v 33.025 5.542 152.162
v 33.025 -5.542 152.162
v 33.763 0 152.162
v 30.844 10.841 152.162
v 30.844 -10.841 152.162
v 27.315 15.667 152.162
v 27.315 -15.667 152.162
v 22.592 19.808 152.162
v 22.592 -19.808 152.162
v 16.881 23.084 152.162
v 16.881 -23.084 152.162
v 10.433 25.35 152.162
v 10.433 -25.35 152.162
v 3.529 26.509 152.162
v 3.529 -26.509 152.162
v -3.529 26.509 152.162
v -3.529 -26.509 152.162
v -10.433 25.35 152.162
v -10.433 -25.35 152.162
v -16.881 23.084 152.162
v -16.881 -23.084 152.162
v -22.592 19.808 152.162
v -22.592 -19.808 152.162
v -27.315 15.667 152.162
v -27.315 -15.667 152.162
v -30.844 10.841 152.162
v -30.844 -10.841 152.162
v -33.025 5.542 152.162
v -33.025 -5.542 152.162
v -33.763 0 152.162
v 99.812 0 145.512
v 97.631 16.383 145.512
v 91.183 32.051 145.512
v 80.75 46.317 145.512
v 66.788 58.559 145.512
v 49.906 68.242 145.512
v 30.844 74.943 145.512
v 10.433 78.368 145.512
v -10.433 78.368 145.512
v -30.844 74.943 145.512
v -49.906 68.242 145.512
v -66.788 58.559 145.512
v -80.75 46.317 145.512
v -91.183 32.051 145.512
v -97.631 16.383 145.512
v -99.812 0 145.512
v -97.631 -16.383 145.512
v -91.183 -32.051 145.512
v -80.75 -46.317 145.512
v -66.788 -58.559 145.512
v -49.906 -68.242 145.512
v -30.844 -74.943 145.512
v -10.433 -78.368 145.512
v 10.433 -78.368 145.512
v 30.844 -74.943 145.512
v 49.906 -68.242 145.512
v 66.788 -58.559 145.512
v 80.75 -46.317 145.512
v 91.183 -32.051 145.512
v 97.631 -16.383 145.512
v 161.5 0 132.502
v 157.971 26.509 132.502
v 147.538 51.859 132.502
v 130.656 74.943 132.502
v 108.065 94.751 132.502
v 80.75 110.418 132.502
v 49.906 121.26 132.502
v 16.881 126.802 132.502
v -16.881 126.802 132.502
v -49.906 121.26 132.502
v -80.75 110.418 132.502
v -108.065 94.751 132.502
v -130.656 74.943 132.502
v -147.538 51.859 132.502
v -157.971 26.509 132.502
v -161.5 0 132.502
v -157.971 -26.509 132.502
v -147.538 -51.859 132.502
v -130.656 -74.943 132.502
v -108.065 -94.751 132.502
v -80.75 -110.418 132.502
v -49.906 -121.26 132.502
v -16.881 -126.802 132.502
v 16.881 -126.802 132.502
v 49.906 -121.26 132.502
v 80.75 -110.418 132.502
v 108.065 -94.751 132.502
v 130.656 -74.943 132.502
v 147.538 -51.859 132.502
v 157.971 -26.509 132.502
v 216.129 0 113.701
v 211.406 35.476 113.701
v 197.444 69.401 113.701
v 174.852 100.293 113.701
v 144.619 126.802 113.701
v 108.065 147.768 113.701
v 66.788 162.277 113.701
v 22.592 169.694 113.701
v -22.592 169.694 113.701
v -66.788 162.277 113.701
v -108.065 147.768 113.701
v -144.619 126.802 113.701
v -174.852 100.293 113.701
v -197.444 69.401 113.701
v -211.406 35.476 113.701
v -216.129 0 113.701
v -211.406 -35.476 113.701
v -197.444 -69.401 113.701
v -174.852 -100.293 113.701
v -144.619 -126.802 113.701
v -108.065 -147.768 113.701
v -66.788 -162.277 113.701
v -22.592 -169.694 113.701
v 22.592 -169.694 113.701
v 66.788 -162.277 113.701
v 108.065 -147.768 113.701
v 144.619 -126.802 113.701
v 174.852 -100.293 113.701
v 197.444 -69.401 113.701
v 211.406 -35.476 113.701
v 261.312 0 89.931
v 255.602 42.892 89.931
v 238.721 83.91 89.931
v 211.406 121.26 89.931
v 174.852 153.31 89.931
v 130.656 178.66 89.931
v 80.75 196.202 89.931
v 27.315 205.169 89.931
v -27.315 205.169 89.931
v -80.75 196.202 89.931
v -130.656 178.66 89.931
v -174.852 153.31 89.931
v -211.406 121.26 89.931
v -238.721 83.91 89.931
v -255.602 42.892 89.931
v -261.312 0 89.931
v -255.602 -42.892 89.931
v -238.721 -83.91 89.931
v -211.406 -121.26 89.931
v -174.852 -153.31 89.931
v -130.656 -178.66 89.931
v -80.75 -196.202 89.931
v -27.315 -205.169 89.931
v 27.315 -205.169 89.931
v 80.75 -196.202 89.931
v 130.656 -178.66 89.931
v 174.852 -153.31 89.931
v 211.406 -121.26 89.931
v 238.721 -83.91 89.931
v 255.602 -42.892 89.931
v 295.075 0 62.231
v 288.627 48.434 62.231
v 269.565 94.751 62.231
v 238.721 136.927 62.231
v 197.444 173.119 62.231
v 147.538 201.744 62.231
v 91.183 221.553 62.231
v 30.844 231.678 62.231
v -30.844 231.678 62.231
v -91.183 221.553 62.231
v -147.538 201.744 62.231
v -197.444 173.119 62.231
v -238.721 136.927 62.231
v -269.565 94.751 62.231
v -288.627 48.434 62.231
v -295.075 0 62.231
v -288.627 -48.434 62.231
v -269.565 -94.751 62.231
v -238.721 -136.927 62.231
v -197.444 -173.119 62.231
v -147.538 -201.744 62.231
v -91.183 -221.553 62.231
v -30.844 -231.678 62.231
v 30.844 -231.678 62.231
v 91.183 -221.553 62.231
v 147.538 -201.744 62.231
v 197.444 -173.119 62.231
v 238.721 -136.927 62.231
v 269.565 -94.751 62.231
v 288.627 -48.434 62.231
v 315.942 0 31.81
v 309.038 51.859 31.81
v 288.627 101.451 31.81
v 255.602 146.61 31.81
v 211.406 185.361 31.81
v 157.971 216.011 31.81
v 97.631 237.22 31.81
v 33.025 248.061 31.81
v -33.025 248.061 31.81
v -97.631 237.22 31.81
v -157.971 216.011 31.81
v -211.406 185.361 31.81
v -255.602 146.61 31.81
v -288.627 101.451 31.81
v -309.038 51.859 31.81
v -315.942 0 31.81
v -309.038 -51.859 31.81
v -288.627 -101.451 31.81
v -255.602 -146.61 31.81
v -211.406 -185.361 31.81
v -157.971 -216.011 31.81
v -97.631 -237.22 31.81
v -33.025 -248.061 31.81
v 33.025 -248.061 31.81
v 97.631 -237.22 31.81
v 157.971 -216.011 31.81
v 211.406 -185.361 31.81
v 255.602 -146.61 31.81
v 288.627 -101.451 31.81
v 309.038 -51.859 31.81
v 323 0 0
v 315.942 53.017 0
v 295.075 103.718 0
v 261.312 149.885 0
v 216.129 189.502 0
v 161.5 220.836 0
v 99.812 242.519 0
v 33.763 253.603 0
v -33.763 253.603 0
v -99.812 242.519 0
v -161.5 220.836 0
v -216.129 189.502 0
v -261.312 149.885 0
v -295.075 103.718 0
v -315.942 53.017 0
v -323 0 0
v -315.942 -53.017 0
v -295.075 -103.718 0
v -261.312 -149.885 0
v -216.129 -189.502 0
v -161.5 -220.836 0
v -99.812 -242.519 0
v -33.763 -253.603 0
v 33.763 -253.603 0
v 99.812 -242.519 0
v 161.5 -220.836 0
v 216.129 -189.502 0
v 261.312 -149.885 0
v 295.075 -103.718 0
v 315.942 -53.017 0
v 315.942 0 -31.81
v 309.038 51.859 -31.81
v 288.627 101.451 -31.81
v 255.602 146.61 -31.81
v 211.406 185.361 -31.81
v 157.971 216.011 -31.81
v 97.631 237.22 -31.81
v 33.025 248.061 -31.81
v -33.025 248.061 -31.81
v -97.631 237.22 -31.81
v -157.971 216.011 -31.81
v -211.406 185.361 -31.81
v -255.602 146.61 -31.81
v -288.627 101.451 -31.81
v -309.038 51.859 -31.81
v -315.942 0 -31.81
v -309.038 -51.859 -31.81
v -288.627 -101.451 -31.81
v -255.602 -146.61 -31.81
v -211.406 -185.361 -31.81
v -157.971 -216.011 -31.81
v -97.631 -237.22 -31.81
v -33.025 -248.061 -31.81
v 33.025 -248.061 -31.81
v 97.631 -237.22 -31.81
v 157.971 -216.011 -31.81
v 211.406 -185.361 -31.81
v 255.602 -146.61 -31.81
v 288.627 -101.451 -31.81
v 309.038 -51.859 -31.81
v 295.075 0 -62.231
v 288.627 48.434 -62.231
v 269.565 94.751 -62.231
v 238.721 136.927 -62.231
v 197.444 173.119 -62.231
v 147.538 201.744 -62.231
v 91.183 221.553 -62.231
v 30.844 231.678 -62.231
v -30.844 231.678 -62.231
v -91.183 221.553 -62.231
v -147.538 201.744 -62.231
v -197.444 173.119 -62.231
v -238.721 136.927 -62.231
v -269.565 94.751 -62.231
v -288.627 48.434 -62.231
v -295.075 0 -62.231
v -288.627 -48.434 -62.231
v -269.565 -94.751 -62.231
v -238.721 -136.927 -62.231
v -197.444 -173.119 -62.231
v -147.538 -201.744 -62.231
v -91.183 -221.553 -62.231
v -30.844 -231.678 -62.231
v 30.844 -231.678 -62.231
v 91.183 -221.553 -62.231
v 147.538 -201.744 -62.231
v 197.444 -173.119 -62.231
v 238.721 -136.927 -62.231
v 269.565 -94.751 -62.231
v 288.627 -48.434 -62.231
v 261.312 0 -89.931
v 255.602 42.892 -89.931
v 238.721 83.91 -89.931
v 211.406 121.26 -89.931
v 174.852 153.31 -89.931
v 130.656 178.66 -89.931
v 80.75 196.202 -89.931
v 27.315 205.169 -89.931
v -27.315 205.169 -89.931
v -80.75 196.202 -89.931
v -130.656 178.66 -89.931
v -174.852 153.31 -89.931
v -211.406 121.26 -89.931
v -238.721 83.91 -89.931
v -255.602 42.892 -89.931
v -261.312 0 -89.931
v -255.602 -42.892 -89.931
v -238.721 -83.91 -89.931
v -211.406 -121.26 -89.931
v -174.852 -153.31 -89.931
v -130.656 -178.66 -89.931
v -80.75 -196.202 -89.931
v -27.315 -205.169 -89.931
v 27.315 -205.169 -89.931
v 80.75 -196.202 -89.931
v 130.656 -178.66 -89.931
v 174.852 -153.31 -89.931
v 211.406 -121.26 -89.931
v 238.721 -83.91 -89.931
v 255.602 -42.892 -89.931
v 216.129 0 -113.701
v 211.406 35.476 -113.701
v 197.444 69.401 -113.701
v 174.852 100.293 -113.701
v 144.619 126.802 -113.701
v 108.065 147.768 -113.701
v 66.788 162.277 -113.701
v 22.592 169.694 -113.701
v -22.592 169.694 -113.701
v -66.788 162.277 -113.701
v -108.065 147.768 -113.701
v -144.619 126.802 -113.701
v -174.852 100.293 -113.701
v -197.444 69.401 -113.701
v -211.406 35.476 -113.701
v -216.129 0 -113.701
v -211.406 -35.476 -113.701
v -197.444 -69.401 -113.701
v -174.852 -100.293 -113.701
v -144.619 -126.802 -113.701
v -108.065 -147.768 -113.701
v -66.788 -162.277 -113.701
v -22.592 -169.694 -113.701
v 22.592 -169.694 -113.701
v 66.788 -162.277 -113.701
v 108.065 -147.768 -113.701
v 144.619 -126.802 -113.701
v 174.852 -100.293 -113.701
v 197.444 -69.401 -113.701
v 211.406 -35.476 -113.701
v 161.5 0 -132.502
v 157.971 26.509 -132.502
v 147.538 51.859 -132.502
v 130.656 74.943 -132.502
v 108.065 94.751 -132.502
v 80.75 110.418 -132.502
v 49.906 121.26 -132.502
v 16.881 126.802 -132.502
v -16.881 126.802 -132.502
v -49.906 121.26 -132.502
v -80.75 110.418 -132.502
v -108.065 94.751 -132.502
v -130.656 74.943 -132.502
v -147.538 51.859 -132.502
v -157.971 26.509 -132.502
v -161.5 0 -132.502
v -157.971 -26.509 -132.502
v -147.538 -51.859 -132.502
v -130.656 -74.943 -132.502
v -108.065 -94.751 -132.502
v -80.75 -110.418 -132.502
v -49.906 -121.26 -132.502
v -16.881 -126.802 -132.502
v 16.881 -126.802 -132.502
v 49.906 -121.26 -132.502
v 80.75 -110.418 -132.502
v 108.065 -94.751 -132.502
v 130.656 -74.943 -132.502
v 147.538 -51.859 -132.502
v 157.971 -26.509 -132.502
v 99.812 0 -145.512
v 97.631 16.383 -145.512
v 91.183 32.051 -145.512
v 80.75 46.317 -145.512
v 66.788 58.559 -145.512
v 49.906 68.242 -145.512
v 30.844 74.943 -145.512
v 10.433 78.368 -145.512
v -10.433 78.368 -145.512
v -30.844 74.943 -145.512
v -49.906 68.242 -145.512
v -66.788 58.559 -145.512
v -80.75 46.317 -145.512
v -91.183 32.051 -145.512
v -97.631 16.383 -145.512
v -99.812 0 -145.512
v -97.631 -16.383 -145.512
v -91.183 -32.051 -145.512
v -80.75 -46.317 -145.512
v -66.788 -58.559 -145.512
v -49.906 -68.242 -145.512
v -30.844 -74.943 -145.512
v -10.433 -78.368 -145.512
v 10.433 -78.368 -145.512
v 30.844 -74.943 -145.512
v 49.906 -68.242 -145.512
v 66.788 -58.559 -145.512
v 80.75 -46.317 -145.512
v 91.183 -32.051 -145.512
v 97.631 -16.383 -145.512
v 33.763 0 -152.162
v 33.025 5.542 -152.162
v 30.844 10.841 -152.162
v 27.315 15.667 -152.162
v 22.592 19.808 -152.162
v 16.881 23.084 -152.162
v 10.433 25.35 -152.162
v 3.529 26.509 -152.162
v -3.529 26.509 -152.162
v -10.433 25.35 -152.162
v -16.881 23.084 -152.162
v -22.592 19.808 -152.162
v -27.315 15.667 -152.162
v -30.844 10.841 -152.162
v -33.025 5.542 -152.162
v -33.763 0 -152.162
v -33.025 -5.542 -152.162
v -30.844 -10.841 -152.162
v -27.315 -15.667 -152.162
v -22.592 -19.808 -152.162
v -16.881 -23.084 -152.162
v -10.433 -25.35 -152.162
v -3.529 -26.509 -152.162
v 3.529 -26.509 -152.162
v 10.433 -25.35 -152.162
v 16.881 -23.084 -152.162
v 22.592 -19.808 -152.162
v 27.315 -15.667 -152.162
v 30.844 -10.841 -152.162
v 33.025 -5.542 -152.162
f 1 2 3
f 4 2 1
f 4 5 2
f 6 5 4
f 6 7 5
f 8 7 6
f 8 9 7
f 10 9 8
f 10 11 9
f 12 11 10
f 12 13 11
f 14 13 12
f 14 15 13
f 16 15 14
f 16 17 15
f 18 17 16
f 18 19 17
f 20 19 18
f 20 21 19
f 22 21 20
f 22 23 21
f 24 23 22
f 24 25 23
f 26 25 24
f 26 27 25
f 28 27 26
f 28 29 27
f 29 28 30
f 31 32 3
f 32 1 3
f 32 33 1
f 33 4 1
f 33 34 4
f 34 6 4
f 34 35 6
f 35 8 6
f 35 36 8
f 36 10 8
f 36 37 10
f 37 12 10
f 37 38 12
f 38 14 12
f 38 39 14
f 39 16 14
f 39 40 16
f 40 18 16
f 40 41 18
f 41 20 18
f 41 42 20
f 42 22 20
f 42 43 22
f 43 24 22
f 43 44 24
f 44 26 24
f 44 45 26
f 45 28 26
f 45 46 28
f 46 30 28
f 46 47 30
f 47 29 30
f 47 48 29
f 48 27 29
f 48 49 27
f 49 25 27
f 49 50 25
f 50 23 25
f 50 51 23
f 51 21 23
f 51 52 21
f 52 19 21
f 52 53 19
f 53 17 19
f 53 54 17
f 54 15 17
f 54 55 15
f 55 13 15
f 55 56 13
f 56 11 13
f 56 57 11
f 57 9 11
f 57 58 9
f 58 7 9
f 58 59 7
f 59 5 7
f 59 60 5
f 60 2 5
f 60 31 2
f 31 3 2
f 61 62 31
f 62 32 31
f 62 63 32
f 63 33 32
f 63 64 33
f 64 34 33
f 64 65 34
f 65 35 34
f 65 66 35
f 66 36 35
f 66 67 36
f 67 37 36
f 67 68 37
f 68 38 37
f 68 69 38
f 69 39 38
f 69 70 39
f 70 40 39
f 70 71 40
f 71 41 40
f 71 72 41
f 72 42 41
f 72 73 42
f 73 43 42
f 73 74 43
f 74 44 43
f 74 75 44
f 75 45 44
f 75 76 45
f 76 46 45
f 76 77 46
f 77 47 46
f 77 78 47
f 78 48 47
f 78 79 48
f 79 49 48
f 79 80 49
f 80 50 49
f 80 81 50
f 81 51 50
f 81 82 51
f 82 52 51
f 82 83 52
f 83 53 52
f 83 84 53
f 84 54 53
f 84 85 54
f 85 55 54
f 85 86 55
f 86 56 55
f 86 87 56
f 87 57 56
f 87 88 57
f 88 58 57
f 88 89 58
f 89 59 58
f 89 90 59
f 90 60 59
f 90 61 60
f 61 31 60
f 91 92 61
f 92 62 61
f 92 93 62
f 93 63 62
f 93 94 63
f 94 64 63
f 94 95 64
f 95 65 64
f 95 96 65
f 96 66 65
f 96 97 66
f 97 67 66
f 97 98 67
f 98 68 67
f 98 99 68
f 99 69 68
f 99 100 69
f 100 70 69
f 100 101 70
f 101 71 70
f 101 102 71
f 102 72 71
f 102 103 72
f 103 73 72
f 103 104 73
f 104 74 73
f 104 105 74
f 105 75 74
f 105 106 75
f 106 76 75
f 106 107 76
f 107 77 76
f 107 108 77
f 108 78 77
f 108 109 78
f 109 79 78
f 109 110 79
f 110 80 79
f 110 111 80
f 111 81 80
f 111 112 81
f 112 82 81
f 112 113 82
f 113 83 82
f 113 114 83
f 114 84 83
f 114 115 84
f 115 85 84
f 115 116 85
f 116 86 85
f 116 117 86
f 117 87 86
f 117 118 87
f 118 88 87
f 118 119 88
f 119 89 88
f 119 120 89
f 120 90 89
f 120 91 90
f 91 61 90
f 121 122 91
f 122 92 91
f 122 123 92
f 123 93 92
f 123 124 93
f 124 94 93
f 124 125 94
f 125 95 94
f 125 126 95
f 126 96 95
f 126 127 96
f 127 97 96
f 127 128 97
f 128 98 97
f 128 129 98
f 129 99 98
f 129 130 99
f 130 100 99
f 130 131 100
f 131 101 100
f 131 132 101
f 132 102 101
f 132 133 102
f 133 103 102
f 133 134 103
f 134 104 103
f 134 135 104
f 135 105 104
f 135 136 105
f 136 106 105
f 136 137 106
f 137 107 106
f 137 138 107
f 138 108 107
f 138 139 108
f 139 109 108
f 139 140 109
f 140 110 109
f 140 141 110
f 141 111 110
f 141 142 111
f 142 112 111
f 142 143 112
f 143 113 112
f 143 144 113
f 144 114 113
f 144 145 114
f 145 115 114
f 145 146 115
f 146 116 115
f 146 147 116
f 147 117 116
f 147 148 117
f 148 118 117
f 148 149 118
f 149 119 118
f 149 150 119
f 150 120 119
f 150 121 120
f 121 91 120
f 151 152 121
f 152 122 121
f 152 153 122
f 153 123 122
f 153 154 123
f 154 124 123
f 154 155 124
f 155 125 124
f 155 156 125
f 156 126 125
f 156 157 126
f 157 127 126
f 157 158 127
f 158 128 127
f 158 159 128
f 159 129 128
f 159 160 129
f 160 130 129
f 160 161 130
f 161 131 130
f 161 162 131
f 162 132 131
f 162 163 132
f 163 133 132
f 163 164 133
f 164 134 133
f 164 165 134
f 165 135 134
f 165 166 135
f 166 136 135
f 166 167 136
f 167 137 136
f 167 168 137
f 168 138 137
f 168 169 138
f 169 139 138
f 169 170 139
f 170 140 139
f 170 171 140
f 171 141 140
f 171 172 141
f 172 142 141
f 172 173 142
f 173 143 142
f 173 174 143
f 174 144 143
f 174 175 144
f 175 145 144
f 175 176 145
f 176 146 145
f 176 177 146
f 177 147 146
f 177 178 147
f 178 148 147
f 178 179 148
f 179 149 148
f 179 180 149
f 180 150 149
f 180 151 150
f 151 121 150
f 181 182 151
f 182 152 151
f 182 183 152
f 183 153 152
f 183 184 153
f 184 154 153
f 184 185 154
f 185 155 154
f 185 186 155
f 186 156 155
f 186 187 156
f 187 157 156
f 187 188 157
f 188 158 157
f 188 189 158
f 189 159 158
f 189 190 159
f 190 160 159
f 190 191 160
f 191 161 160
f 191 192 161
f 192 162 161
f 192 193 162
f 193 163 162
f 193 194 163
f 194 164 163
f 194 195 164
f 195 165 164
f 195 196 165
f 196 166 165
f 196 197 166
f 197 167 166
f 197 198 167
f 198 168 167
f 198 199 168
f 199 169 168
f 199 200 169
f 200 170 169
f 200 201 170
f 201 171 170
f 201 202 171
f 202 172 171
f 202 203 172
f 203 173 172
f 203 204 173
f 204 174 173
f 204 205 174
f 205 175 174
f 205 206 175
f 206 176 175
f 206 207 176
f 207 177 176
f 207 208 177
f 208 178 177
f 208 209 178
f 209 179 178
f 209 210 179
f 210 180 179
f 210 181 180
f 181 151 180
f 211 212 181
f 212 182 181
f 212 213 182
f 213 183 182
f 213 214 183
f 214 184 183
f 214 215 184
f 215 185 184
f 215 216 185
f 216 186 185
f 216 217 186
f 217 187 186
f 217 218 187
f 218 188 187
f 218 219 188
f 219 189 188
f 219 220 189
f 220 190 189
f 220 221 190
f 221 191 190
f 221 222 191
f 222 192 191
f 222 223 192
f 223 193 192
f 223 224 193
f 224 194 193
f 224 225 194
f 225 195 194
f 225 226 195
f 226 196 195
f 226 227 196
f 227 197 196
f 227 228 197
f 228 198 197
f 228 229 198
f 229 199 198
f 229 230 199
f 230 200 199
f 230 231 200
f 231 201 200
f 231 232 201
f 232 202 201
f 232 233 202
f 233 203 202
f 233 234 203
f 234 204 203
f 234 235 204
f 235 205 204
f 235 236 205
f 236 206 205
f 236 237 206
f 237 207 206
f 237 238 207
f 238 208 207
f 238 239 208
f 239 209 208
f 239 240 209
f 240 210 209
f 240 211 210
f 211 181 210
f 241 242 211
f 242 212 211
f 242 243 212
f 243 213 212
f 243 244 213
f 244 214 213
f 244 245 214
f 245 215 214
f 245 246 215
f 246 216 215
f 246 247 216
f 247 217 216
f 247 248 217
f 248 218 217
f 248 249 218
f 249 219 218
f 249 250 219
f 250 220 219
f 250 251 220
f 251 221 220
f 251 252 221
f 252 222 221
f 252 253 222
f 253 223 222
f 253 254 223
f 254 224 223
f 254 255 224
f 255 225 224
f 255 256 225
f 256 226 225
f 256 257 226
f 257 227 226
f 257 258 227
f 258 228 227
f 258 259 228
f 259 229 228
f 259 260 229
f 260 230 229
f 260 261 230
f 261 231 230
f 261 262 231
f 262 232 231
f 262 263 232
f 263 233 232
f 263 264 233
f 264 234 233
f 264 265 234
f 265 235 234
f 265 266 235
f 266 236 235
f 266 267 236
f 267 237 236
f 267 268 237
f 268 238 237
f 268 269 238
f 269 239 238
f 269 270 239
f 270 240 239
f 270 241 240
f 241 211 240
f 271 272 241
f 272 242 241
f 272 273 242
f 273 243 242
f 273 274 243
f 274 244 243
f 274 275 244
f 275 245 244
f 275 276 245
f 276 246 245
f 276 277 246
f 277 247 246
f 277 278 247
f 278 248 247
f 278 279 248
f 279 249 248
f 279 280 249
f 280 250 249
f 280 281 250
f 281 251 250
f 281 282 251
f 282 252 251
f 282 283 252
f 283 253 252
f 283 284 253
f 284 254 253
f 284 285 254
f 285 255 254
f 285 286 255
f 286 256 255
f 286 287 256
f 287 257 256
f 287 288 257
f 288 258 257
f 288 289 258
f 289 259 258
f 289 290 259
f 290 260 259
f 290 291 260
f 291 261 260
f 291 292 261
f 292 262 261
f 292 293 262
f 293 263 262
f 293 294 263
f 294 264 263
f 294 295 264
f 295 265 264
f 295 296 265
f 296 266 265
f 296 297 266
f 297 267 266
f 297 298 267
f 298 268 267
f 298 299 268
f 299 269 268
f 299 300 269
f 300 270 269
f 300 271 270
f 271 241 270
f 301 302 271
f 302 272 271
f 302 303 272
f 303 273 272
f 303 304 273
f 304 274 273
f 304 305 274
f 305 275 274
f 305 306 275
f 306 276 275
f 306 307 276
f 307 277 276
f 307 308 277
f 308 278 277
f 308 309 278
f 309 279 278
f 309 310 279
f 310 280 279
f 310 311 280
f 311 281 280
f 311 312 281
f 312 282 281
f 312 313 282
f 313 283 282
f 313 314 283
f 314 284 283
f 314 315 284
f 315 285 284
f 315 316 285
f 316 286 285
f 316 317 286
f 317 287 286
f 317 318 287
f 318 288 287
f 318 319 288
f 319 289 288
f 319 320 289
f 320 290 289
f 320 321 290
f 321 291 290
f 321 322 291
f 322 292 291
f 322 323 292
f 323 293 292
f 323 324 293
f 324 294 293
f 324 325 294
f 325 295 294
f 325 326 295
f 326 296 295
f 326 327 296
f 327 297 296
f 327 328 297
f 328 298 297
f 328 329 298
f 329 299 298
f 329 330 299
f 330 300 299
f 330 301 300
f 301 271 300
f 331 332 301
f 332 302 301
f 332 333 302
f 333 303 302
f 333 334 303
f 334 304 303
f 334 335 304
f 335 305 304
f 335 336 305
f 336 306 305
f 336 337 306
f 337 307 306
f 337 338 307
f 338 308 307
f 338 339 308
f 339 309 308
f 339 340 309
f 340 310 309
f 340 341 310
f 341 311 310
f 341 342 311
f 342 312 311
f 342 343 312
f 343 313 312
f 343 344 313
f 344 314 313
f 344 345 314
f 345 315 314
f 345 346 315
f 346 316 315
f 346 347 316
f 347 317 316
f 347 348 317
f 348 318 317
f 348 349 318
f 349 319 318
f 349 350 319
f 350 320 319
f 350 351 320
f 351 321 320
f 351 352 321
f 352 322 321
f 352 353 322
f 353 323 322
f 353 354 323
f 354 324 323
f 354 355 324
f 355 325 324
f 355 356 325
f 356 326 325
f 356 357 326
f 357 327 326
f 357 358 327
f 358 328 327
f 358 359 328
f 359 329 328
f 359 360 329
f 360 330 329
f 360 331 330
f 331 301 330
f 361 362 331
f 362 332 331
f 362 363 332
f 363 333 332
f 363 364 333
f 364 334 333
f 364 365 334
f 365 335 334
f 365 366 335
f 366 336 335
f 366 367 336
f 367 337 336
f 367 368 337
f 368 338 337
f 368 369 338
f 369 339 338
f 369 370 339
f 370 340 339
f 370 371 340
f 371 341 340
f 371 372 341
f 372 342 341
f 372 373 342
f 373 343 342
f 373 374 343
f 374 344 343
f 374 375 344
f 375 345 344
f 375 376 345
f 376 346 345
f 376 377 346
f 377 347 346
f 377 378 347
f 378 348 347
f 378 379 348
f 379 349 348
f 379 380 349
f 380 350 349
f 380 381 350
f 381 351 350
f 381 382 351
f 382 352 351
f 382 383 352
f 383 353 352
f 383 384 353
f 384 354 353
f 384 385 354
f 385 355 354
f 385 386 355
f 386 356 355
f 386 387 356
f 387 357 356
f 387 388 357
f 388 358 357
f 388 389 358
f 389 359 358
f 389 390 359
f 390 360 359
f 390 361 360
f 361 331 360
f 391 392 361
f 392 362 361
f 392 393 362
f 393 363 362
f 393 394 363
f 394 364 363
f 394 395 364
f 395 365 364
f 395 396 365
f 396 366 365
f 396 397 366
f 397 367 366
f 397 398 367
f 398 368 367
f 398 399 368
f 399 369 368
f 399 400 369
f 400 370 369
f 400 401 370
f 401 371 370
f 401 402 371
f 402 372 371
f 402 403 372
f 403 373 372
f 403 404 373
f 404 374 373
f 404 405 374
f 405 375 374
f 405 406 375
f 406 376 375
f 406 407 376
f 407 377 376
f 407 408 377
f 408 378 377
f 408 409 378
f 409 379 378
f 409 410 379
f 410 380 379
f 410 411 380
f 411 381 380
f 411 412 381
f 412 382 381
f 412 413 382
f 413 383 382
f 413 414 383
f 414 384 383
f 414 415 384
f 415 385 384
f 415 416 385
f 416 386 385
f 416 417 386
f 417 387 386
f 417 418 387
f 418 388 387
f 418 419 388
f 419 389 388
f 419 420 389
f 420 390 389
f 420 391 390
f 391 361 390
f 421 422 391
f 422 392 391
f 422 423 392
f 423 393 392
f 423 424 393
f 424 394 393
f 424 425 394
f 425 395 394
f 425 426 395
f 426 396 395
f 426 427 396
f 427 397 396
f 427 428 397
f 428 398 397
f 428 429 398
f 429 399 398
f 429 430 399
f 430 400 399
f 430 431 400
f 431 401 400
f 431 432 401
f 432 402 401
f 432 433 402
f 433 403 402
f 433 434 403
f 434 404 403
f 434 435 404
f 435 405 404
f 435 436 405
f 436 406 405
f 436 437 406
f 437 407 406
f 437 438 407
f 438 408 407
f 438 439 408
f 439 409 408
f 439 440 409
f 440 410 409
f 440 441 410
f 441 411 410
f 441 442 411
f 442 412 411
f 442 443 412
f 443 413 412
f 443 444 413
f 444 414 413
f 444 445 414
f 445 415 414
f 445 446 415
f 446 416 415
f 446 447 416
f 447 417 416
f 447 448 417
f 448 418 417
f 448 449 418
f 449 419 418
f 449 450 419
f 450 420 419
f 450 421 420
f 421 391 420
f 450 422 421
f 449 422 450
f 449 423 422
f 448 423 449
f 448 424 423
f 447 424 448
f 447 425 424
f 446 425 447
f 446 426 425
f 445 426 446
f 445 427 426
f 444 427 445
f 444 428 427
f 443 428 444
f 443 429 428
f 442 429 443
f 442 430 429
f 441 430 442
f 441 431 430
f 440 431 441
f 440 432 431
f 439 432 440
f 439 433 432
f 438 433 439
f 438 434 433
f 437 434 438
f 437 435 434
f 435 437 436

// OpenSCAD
// Generated by SolidPython 1.0.1 on 2020-07-29 00:46:54


scale(v = [19, 15, 9]) {
	sphere(r = 17);
}
/***********************************************
*********      SolidPython code:      **********
************************************************
 
# import packages: SolidPython
from solid import *
from solid.utils import *
from itertools import chain, combinations, permutations


class Resize:

    def __init__(self, scad_file):
        self.scad_file = scad_file
        #self.scad_file = import_scad(scad_file)
        # cone/cylinder param:
        self.r1 = 0
        self.r2 = 0
        self.h = 0
        # rectangular prism param:
        self.w = 0
        self.l = 0
        # ellipse param:
        self.r = 0

    # import OpenScad code (file name corresponds to shape)


    # classify shape + parameters
    def assign(self, param1, param2, param3):
        if self.scad_file == 'cone.scad':
            self.r1 = param1
            self.r2 = param2
            self.h = param3
        elif self.scad_file == 'cylinder.scad':
            self.r1 = param1
            self.r2 = param2
            self.h = param3
        elif self.scad_file == 'rectangularPrism.scad':
            self.h = param1
            self.l = param2
            self.w = param3
        else:
            self.r = param1
            self.h = param2

    # resize parameters
    def iterate(self):
        x = range(3, 20, 2)
        i = 1
        if self.scad_file == 'cone.scad':
            tempList = list(permutations(x, 2))
            for temp in tempList:
                param1 = temp[0]
                param2 = temp[1]
                filepath = 'produced_scad_files/' + 'cone' + str(param1) + '_' + str(param2) + '_' + '.scad'
                scad_render_to_file(cylinder(h=param1, r1=param2, r2=0), filepath)

        elif self.scad_file == 'cylinder.scad':
            tempList = list(permutations(x, 3))
            for temp in tempList:
                param1 = temp[0]
                param2 = temp[1]
                filepath = 'produced_scad_files/' + 'cylinder' + str(param1) + '_' + str(param2) + '_' + '.scad'
                scad_render_to_file(cylinder(h=param1, r1=param2, r2=param2), filepath)

        elif self.scad_file == 'rectangularPrism.scad':
            tempList = list(permutations(x, 3))
            for temp in tempList:
                param1 = temp[0]
                param2 = temp[1]
                param3 = temp[2]
                filepath = 'produced_scad_files/' + 'rectangularPrism' + str(param1) + '_' + str(param2) + '_' + str(
                    param3) + '.scad'
                scad_render_to_file(cube(size=(param1, param2, param3)), filepath)

        elif self.scad_file == 'ellipse.scad':
            tempList = list(permutations(x, 4))
            for temp in tempList:
                param1 = temp[0]
                param2 = temp[1]
                param3 = temp[2]
                param4 = temp[3]
                filepath = 'produced_scad_files/' + 'ellipse' + str(param1) + '_' + str(param2) + '_' + str(param3) + '_' + str(param4) + '.scad'
                scad_render_to_file(scale([param1, param2, param3])(sphere(r=param4)), filepath)

    def render_to_scadfile(self):
        scad_render_to_file(scad, 'example.scad') 
 
************************************************/
